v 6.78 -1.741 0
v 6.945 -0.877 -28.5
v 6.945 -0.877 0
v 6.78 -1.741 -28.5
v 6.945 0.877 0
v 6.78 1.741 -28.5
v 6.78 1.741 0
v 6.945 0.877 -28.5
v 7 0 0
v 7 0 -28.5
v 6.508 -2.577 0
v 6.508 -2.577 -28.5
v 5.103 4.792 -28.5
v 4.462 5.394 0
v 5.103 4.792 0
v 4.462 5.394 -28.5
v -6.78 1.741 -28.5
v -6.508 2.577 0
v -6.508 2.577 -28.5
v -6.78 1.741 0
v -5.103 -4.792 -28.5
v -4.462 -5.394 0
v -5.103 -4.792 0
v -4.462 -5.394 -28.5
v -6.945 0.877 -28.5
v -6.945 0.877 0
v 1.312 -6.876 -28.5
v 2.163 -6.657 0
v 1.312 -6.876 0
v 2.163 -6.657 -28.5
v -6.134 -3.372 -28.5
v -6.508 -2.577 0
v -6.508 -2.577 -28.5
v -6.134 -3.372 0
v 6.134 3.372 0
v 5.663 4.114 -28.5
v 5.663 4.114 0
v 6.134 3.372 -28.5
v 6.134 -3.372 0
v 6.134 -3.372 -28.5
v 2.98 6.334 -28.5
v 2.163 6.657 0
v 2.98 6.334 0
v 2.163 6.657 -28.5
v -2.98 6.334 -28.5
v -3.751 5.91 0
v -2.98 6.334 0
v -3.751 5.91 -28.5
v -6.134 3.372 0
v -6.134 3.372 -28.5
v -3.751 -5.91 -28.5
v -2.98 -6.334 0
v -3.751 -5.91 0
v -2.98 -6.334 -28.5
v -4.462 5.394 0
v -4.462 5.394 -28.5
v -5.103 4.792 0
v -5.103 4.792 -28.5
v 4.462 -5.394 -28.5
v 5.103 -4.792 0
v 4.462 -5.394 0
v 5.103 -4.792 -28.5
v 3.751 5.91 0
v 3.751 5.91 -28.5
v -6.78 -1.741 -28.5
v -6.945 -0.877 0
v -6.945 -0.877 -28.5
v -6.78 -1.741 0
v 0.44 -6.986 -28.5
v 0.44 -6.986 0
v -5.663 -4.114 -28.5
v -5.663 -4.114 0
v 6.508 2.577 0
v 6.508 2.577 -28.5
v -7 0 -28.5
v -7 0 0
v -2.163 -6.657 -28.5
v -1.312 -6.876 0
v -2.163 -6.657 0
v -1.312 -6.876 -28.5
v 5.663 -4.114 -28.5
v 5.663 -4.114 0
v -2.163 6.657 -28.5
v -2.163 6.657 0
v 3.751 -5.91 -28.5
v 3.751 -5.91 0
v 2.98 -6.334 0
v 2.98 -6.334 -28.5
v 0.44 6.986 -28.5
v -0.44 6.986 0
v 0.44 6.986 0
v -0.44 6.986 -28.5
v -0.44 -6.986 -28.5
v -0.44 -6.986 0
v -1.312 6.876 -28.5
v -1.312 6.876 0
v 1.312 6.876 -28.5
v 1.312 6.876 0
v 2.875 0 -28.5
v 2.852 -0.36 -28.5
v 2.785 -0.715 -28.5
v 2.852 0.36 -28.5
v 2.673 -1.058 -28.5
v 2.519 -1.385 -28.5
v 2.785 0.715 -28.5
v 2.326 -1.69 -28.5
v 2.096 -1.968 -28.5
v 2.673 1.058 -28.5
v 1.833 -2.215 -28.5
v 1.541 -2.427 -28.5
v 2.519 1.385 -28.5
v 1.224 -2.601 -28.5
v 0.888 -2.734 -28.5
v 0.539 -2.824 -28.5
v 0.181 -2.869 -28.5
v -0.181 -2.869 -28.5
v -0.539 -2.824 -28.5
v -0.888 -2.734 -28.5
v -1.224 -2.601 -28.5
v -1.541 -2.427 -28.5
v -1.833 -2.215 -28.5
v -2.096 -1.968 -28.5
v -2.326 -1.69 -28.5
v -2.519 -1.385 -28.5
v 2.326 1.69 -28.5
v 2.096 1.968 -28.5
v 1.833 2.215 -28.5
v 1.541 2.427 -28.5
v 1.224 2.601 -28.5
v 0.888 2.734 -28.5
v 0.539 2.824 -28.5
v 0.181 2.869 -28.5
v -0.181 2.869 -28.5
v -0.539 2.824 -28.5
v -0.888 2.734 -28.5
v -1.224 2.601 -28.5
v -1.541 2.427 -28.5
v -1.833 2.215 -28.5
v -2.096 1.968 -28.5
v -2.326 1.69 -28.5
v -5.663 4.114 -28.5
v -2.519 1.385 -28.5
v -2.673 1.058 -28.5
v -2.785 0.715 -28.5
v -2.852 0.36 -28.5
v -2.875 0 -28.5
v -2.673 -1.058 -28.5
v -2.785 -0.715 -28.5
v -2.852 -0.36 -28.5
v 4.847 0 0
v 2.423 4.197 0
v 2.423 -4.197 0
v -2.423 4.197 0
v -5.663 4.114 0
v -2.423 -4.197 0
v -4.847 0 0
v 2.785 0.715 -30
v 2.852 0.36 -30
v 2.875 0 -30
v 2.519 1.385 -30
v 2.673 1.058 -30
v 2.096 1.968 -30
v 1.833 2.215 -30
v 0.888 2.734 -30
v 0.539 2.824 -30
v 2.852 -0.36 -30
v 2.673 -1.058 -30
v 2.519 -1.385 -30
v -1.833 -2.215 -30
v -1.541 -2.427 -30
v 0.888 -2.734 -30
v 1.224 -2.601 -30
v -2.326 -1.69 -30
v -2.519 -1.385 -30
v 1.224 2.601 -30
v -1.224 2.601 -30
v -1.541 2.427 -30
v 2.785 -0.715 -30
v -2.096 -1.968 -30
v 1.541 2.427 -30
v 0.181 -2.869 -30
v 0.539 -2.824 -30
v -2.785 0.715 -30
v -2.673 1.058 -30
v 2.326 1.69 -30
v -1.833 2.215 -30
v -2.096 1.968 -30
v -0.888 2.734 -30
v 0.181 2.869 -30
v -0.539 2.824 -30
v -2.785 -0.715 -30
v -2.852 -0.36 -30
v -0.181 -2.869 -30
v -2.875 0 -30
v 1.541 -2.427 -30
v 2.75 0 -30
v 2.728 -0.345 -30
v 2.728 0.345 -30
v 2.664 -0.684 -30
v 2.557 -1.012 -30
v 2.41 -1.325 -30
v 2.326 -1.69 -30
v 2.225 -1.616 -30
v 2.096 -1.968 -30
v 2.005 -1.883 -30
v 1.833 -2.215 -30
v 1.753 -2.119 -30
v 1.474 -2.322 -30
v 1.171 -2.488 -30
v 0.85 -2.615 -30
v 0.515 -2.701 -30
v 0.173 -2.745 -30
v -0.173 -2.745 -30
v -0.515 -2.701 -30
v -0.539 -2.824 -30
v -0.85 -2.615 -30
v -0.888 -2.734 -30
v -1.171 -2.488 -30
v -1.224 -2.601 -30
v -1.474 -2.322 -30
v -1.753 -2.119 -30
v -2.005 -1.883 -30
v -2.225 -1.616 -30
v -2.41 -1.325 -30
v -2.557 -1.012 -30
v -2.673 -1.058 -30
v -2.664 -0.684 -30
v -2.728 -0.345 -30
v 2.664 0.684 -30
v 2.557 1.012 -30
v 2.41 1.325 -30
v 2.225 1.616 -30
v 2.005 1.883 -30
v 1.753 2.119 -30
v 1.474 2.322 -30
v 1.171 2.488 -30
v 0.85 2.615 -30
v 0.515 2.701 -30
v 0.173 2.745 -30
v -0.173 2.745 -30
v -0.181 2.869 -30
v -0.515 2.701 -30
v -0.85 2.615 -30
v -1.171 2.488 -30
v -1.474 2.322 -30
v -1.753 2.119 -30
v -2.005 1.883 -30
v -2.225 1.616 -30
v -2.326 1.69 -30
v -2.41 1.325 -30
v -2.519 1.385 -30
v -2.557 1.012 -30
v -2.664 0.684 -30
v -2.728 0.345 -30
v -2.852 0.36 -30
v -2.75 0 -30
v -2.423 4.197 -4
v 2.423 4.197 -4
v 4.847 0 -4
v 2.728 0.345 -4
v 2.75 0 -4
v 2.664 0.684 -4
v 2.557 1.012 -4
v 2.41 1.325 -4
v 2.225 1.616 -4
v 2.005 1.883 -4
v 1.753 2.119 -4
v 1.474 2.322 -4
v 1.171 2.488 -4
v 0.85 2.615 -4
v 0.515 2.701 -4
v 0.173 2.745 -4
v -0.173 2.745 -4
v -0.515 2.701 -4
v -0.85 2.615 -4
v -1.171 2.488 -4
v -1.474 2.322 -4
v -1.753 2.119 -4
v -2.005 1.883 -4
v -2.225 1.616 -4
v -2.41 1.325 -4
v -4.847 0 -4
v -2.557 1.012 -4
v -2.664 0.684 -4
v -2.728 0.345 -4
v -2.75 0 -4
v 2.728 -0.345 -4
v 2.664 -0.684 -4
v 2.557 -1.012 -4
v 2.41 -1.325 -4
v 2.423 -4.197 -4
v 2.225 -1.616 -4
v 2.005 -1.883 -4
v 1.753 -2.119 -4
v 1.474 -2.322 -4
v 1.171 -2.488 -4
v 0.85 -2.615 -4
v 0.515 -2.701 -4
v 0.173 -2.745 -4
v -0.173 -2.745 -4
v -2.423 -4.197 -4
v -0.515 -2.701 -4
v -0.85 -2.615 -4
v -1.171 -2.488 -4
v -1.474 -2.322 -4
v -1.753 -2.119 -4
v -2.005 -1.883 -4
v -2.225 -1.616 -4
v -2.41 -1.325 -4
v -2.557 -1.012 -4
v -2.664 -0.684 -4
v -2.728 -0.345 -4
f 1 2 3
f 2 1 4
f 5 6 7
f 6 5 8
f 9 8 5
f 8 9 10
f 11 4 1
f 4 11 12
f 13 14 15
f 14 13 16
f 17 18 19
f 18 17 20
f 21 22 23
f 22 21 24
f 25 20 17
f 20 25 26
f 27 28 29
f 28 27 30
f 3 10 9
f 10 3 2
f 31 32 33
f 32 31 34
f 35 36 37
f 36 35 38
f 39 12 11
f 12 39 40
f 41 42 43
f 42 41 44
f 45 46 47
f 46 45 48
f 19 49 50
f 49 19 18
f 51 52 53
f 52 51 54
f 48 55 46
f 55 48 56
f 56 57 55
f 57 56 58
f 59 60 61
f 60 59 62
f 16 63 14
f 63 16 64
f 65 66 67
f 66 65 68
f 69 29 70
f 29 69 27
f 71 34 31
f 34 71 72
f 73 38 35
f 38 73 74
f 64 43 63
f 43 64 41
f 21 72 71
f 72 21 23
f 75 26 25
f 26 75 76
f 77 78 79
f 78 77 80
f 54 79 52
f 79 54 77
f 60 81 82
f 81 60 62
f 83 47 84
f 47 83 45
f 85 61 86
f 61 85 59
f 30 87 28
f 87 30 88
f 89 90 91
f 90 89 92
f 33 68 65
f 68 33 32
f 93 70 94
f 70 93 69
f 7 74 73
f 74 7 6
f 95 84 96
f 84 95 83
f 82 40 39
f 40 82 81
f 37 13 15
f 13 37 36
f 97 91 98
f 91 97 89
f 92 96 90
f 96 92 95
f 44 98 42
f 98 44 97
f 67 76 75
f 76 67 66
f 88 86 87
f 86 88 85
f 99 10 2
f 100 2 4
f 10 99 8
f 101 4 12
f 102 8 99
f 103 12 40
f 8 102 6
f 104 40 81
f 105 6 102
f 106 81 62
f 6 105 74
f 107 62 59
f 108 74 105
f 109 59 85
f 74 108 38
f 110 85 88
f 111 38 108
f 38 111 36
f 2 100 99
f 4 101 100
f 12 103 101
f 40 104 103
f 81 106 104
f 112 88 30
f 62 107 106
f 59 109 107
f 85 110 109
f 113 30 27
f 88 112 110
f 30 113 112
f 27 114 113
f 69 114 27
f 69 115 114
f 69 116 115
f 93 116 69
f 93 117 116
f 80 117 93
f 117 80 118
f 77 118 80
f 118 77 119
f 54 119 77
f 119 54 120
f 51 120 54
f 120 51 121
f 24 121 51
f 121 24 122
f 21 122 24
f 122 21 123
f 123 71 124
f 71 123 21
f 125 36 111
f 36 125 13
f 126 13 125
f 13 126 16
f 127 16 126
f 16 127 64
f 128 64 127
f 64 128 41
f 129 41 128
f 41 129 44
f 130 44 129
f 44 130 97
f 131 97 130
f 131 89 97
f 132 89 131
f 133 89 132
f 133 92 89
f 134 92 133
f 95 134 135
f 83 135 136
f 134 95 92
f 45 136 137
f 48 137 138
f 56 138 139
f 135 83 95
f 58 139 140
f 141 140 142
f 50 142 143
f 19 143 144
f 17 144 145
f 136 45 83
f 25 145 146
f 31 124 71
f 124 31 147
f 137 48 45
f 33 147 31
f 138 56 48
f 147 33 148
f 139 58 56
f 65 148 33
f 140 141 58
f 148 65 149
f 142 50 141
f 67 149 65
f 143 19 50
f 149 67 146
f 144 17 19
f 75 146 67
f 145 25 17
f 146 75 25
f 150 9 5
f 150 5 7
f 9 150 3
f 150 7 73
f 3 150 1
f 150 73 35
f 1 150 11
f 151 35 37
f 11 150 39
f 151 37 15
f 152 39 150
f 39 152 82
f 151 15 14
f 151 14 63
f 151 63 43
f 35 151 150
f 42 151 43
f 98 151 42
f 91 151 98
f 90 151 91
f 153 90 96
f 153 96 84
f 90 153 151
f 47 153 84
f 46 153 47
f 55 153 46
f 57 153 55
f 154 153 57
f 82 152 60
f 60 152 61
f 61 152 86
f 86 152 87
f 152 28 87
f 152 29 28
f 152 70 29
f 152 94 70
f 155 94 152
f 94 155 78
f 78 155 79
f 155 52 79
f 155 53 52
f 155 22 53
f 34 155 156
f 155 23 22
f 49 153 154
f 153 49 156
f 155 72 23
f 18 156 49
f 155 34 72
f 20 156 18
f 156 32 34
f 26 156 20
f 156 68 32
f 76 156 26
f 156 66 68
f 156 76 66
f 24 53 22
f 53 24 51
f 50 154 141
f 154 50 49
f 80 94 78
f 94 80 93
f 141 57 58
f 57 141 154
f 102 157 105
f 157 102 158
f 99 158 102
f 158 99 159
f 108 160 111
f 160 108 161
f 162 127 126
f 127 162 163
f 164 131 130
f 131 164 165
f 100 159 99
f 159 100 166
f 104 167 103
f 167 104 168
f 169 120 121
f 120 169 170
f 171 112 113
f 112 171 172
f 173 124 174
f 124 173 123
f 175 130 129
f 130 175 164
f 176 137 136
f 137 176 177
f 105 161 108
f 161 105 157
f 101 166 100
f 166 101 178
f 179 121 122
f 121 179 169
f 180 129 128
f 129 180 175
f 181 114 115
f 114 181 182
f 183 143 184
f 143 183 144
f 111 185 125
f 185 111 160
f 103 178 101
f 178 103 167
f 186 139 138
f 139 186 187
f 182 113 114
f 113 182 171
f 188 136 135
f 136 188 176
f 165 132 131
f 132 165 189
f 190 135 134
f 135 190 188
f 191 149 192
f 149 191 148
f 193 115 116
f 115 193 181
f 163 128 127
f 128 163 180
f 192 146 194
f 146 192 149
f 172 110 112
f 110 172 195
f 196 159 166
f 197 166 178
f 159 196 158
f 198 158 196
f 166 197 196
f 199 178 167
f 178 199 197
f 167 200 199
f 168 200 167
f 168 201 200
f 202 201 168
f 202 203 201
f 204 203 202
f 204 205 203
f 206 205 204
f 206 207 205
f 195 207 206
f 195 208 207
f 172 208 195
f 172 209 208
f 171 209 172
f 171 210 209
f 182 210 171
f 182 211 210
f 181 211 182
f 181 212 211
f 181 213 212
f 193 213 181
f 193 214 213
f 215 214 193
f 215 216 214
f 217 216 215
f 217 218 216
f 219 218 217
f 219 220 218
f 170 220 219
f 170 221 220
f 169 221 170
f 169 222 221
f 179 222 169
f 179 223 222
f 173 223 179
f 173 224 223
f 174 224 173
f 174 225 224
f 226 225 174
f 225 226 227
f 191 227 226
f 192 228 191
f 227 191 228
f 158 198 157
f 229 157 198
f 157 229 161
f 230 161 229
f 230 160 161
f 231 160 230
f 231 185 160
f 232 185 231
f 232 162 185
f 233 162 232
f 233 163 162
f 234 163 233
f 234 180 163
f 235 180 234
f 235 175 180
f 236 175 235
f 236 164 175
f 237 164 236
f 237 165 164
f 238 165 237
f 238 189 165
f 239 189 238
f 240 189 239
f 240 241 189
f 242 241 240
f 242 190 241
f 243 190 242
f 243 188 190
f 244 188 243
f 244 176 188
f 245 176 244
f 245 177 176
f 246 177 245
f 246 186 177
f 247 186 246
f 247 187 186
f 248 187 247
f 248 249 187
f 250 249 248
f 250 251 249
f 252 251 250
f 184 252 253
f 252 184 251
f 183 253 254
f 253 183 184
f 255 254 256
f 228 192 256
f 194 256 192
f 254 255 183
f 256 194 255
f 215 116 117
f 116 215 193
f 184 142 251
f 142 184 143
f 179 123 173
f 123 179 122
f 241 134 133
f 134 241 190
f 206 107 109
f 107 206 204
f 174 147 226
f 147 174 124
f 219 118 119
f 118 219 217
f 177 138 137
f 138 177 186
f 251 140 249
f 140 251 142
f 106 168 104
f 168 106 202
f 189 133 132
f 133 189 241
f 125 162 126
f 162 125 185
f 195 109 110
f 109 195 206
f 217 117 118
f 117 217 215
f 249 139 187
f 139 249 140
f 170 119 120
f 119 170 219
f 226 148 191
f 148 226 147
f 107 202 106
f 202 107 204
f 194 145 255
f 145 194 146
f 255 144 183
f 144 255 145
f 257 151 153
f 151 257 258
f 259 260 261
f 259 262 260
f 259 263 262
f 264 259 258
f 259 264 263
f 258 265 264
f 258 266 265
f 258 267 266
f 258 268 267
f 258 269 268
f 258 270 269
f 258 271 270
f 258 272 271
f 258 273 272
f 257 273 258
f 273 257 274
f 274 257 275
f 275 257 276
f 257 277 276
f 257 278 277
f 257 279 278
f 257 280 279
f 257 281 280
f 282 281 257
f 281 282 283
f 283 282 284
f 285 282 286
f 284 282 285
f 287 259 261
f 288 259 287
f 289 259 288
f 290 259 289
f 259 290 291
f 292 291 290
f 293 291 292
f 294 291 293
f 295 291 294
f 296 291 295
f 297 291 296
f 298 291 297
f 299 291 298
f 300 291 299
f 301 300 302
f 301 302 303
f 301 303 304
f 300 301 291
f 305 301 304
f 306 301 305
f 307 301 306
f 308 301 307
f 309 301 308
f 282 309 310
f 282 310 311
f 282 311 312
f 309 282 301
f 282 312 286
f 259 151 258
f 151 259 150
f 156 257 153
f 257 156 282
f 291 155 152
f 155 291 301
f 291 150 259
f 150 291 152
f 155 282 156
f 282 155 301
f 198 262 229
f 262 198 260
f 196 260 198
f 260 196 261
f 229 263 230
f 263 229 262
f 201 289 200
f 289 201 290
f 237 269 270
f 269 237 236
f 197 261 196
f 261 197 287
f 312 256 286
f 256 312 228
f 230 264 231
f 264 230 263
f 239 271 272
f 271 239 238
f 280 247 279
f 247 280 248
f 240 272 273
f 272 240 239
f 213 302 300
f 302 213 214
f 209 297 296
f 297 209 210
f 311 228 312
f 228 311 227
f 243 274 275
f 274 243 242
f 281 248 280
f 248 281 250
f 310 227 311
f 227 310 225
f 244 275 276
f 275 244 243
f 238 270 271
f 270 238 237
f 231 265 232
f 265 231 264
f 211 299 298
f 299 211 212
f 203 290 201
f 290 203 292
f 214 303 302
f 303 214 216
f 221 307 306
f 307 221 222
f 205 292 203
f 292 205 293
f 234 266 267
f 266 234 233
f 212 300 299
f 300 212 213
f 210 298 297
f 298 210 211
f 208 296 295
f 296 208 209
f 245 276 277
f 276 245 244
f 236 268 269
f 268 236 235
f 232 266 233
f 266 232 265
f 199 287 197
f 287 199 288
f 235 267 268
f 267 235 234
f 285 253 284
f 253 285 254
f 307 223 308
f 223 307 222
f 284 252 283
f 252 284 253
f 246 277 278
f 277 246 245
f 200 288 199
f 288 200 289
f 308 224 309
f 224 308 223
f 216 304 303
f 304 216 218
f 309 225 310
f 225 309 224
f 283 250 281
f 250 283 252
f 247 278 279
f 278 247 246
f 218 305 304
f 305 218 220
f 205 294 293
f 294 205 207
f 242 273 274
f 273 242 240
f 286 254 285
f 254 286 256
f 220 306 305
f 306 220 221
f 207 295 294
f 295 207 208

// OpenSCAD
$fn = 50;

difference() {
	union() {
		translate(v = [0, 0, -28.5]) {
			cylinder(h = 28.5, r = 7.0);
		}
		#translate(v = [0, 0, -30.0]) {
			cylinder(h = 30, r = 2.875);
		}
	}
	union() {
		translate(v = [0, 0, 0]) {
			rotate(a = [0, 0, 0]) {
				difference() {
					union() {
						translate(v = [0, 0, -4]) {
							linear_extrude(height = 4) {
								polygon(points = [[4.8468, 0.0], [2.4234000000000004, 4.197451927062417], [-2.423399999999999, 4.197451927062417], [-4.8468, 5.935618106107392e-16], [-2.423400000000002, -4.197451927062416], [2.423399999999997, -4.197451927062419]]);
							}
						}
					}
					union();
				}
			}
		}
		#translate(v = [0, 0, -100.0]) {
			cylinder(h = 200, r = 2.75);
		}
	}
}
